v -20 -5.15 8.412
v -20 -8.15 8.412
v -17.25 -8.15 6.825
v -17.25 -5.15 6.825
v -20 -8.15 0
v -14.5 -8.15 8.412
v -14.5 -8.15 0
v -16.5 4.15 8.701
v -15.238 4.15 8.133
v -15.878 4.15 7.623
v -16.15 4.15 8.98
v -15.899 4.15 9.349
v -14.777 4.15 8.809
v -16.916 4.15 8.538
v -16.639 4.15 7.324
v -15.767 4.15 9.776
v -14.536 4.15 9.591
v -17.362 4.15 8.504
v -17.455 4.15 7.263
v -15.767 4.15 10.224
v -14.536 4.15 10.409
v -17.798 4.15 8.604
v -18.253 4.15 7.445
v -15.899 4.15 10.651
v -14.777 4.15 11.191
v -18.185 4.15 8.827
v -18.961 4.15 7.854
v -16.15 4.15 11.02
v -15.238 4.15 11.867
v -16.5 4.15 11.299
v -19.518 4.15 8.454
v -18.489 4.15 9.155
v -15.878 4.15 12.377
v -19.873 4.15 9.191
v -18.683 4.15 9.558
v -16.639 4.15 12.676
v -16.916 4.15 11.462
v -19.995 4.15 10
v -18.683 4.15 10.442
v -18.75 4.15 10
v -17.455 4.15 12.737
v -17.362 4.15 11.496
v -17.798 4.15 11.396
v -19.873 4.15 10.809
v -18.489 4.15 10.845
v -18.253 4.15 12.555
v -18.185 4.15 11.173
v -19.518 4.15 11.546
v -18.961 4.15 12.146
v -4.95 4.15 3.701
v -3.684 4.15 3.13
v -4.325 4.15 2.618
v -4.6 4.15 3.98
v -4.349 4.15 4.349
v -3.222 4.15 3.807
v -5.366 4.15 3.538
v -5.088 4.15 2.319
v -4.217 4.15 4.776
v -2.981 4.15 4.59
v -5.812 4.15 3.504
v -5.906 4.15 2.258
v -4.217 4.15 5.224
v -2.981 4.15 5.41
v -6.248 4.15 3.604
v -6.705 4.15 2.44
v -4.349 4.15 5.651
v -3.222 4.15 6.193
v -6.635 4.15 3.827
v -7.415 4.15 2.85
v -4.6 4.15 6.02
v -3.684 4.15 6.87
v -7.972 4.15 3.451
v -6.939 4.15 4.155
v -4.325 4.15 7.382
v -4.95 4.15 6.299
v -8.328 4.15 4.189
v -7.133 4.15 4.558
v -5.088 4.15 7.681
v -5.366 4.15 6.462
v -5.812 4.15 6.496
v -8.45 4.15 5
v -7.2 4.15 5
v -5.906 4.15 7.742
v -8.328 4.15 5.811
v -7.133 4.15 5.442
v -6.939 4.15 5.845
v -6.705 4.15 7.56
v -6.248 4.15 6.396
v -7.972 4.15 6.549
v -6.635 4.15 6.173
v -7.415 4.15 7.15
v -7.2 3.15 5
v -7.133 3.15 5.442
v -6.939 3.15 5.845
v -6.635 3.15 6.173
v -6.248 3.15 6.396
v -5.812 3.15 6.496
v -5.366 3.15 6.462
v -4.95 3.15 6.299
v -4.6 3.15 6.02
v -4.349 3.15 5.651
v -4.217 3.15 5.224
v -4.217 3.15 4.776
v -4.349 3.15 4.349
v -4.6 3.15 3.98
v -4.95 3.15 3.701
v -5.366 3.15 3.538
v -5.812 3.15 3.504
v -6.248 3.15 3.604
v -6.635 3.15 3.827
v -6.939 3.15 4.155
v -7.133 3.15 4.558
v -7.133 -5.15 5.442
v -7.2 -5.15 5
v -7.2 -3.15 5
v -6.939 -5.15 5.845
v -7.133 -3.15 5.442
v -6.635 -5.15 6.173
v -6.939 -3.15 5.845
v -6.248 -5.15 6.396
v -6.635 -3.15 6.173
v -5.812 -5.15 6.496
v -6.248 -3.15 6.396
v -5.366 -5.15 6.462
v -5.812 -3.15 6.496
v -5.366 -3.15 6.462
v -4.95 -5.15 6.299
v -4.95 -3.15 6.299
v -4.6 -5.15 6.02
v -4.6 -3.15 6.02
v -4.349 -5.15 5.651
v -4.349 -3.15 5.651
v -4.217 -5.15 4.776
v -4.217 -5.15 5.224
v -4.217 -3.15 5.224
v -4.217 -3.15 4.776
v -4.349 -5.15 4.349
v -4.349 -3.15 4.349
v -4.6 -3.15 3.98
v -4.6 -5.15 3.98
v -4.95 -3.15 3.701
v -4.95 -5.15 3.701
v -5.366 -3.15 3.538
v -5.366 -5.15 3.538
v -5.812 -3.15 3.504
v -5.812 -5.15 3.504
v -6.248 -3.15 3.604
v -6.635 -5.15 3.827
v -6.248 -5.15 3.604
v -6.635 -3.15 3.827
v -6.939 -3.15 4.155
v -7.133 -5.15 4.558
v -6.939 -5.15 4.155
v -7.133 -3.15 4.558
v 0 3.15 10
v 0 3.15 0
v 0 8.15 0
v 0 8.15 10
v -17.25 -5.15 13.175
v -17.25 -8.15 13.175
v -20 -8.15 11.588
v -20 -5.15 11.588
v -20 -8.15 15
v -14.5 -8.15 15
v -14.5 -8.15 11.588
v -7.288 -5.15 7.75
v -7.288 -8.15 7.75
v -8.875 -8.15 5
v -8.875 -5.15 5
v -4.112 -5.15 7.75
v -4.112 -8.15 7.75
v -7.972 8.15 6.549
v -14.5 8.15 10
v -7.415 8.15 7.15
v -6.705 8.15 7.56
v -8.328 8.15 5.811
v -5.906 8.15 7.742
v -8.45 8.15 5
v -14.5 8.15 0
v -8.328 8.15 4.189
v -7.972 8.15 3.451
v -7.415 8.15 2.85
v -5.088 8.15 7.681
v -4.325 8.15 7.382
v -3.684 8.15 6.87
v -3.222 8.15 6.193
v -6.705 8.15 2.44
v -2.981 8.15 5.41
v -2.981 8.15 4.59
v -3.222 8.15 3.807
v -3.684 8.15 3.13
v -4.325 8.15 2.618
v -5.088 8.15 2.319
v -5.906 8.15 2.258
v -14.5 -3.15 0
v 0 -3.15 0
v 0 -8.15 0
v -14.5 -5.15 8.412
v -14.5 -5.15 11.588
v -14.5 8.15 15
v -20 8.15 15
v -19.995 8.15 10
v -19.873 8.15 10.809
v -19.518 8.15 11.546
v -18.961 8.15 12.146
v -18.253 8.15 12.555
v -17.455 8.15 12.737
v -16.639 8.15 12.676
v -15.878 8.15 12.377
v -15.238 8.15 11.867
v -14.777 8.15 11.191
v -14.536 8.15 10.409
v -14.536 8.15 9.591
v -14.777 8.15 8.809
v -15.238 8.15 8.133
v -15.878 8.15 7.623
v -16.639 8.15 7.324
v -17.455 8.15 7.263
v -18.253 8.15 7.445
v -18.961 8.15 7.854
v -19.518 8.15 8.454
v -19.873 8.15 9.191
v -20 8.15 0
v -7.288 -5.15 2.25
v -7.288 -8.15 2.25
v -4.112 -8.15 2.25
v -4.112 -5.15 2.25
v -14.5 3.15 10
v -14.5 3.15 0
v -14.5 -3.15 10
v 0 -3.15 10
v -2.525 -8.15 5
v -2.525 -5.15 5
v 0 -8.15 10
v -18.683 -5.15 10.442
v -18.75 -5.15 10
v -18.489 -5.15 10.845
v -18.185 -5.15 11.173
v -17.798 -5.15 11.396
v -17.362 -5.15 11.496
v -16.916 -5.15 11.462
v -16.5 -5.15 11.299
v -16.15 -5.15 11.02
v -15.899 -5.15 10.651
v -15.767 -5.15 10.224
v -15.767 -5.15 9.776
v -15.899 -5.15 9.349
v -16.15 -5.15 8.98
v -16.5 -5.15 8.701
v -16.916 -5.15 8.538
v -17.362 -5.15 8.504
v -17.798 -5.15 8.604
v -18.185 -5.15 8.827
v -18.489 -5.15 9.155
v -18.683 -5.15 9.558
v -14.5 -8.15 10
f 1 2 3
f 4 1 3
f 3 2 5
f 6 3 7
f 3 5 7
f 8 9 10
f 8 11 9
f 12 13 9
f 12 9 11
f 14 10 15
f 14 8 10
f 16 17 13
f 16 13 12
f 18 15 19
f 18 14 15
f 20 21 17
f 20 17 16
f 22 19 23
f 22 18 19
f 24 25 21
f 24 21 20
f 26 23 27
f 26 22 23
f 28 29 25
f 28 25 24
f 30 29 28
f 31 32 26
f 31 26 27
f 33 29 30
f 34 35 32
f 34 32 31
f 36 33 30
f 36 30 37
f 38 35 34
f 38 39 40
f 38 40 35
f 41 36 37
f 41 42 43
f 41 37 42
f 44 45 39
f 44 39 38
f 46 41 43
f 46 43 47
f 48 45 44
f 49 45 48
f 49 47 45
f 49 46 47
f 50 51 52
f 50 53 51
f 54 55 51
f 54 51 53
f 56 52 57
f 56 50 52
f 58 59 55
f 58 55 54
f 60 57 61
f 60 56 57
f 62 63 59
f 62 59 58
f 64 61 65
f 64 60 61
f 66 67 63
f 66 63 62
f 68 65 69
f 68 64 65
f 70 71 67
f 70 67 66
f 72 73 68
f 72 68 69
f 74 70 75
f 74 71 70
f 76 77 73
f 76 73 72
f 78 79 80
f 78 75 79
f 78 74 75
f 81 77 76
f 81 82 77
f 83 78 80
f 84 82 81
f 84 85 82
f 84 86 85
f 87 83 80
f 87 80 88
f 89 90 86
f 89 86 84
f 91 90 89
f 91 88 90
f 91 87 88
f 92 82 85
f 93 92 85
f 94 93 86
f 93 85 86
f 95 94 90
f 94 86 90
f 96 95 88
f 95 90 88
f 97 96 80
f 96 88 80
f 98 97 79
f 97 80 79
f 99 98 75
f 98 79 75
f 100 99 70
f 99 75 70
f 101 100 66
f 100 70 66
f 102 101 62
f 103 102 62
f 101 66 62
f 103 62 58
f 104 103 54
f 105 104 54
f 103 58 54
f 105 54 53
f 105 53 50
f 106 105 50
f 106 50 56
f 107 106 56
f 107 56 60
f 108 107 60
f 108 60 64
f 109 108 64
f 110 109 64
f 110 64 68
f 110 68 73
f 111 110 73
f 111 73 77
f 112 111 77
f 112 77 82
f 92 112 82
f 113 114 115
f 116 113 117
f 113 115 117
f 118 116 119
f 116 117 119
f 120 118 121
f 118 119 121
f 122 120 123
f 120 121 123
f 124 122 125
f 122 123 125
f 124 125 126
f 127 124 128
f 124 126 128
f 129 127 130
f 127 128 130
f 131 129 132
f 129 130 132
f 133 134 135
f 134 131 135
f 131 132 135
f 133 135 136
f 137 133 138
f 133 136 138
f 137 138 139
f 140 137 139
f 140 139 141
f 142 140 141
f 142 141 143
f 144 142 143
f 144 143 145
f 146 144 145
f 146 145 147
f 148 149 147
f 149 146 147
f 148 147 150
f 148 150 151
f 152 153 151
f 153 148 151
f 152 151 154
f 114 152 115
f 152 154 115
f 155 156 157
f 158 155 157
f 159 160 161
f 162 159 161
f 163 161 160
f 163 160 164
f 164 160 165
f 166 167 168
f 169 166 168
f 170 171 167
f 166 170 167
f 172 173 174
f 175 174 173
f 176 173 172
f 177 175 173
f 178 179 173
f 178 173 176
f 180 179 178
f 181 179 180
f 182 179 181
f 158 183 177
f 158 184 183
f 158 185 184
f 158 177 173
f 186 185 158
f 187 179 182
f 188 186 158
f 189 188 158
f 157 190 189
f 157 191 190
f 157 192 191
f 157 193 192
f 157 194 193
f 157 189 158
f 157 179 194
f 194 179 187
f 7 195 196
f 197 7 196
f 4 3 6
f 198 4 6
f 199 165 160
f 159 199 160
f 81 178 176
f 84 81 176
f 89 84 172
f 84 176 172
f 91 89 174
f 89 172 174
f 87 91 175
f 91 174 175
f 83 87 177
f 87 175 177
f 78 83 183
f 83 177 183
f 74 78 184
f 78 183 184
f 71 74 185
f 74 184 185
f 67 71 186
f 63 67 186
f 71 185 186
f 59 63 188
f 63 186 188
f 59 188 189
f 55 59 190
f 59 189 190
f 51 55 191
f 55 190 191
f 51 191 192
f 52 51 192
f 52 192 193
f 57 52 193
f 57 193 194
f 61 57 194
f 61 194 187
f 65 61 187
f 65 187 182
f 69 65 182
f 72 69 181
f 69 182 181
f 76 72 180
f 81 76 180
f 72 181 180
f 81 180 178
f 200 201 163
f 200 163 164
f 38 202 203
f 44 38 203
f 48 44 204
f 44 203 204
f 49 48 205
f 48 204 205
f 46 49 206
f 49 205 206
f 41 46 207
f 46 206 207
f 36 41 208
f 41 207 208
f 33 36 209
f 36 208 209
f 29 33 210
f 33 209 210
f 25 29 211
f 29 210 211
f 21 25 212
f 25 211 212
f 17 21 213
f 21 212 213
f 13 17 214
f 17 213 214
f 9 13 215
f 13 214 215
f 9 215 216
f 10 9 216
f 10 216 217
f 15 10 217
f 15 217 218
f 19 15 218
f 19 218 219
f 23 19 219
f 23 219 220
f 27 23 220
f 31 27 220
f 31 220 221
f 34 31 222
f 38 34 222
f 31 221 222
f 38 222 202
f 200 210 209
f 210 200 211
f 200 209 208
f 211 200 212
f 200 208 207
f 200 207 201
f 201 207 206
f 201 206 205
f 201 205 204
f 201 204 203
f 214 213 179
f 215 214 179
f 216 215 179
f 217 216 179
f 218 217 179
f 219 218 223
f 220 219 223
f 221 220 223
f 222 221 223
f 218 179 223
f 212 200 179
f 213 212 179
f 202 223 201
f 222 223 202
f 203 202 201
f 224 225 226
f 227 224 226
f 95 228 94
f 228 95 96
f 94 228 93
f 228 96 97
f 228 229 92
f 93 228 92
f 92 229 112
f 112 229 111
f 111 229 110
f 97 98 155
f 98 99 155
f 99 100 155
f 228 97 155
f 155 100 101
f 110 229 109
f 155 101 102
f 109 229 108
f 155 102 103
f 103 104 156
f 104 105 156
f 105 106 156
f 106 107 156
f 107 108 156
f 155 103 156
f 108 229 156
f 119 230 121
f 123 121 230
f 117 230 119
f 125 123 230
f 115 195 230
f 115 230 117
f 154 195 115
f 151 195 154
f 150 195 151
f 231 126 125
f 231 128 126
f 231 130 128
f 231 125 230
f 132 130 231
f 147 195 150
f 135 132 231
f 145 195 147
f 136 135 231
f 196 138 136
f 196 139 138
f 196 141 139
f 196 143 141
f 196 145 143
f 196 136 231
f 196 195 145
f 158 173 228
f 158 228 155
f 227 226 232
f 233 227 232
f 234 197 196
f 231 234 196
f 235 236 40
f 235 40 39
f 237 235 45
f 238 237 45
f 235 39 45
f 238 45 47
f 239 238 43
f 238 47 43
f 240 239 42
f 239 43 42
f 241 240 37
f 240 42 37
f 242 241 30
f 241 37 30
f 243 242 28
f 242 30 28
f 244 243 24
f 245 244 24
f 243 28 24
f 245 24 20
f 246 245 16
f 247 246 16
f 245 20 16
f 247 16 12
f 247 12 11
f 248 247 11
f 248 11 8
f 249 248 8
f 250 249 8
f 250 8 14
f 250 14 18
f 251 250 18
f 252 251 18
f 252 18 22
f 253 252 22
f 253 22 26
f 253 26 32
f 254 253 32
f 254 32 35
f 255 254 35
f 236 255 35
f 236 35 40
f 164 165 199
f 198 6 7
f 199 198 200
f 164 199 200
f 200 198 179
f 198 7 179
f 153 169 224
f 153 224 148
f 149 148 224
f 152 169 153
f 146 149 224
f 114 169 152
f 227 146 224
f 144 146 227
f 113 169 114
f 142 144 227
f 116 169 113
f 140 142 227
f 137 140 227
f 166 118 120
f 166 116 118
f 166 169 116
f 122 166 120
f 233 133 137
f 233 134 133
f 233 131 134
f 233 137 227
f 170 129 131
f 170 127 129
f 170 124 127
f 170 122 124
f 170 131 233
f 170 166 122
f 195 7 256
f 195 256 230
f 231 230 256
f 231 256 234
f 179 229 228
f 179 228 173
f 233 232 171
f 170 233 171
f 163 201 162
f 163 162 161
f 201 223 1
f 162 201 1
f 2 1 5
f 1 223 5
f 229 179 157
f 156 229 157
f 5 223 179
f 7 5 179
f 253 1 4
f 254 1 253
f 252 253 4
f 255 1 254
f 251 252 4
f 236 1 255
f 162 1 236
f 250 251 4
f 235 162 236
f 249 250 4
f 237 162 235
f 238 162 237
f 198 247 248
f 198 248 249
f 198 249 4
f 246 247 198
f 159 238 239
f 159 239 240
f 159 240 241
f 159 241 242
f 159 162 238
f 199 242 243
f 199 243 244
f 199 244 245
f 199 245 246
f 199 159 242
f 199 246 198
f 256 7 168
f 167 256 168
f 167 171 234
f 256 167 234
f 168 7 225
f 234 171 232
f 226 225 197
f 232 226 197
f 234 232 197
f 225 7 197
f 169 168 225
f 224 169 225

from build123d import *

# Parameters (mm, degrees)
F0_W     = 14.5
F0_H     = 5
F1_DEPTH = 10
F2_DEPTH = 15
F3_R     = 1.5
F4_DEPTH = 16.3
F3_R_2   = 2.745
F3_R_3   = 2.75
F5_DEPTH = 4
F6_R     = 1.5
F7_DEPTH = 3
F8_R     = 1.5
F9_DEPTH = 3


with BuildPart() as f1:
    # F0 (on Top) → F1 (new body)
    with BuildSketch(Plane.XY):
        with Locations((-7.25, 5.65)):
            Rectangle(F0_W, F0_H)
        with Locations((-7.25, -5.65)):
            Rectangle(F0_W, F0_H)
    extrude(amount=F1_DEPTH)


with BuildPart() as f2:
    # F0 (on Top) → F2 (new body)
    with BuildSketch(Plane.XY):
        Polygon((-14.5, -8.15), (-14.5, -3.15), (-14.5, 0), (-14.5, 3.15), (-14.5, 8.15), (-20, 8.15), (-20, 0), (-20, -8.15), align=None)
    extrude(amount=F2_DEPTH)


with BuildPart() as f4_tool:
    # F3 (on face) → F4 (new body)
    with BuildSketch(Plane(origin=(0, 8.15, 0), x_dir=(-1, 0, 0), z_dir=(0, 1, 0))):
        with Locations((5.7, 5)):
            Circle(F3_R)
        with Locations((17.25, 10)):
            Circle(F3_R)
    extrude(amount=-F4_DEPTH)


with BuildPart() as f1_1:
    add(f1.part)

    # F4: cut by f4_tool
    add(f4_tool.part, mode=Mode.SUBTRACT)


with BuildPart() as f2_1:
    add(f2.part)

    # F4: cut by f4_tool
    add(f4_tool.part, mode=Mode.SUBTRACT)


with BuildPart() as f5_tool:
    # F3 (on face) → F5 (new body)
    with BuildSketch(Plane(origin=(0, 8.15, 0), x_dir=(-1, 0, 0), z_dir=(0, 1, 0))):
        with Locations((17.25, 10)):
            Circle(F3_R_2)
        with Locations((17.25, 10)):
            Circle(F3_R, mode=Mode.SUBTRACT)
        with Locations((5.7, 5)):
            Circle(F3_R_3)
        with Locations((5.7, 5)):
            Circle(F3_R, mode=Mode.SUBTRACT)
    extrude(amount=-F5_DEPTH)


with BuildPart() as f1_2:
    add(f1_1.part)

    # F5: cut by f5_tool
    add(f5_tool.part, mode=Mode.SUBTRACT)

    # F6 (on face) → F7 (cut)
    with BuildSketch(Plane.XZ.offset(8.15)):
        Polygon((-4.112287, 2.25), (-2.524574, 5), (-4.112287, 7.75), (-7.287713, 7.75), (-8.875426, 5), (-7.287713, 2.25), align=None)
        with Locations((-5.7, 5)):
            Circle(F6_R, mode=Mode.SUBTRACT)
    extrude(amount=-F7_DEPTH, mode=Mode.SUBTRACT)


with BuildPart() as f2_2:
    add(f2_1.part)

    # F5: cut by f5_tool
    add(f5_tool.part, mode=Mode.SUBTRACT)

    # F8 (on face) → F9 (cut)
    with BuildSketch(Plane.XZ.offset(8.15)):
        Polygon((-14.5, 11.587713), (-17.25, 13.175426), (-20, 11.587713), (-20, 8.412287), (-17.25, 6.824574), (-14.5, 8.412287), align=None)
        with Locations((-17.25, 10)):
            Circle(F8_R, mode=Mode.SUBTRACT)
    extrude(amount=-F9_DEPTH, mode=Mode.SUBTRACT)


solid = Compound([f1_2.part, f2_2.part])
